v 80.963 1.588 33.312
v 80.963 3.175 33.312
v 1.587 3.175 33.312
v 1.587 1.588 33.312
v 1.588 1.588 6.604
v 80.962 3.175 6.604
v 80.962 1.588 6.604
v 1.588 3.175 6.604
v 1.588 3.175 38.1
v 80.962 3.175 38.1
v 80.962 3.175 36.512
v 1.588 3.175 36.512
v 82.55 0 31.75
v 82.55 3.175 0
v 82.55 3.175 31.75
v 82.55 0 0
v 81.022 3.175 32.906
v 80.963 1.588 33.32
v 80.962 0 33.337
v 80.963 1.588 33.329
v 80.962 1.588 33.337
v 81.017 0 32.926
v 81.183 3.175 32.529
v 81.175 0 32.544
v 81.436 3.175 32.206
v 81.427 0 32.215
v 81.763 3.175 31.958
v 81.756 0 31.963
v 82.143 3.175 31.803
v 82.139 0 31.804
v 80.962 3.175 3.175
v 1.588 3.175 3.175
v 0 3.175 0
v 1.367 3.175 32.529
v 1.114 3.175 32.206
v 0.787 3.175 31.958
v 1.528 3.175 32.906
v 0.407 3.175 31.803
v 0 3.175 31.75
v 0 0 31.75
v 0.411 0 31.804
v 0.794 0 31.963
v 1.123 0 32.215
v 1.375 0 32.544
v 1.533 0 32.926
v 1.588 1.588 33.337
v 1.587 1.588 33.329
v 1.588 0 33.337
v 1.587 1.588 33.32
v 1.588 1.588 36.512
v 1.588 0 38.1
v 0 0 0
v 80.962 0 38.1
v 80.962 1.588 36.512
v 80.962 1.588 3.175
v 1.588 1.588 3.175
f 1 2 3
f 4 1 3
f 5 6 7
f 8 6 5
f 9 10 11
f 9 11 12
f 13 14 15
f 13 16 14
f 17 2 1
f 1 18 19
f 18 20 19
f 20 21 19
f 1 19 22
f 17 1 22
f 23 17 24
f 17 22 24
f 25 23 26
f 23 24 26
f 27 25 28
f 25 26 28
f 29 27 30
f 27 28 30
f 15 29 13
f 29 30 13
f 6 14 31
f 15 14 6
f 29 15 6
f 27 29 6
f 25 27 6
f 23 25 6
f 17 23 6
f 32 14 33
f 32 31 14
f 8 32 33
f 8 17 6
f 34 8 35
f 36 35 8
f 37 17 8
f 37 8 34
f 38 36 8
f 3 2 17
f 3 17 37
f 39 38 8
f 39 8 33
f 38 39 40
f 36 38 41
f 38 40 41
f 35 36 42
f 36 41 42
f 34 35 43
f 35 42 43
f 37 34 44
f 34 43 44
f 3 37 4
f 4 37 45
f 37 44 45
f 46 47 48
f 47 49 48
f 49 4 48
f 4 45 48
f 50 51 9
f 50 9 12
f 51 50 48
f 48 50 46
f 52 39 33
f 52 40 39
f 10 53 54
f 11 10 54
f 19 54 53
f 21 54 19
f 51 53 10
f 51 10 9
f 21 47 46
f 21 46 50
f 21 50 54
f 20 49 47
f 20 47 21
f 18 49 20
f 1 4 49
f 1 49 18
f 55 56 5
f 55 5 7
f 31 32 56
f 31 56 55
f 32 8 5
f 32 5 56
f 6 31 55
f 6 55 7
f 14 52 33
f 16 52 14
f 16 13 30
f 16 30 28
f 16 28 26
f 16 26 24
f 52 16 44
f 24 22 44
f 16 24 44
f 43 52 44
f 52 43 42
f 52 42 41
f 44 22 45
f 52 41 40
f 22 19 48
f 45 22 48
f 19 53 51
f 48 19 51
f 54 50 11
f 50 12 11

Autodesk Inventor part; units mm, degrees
ref_plane "YZ Plane" through (0, 0, 0) normal (1, 0, 0) x (0, 1, 0)
ref_plane "XZ Plane" through (0, 0, 0) normal (0, 1, 0) x (-1, 0, 0)
ref_plane "XY Plane" through (0, 0, 0) normal (0, 0, 1) x (1, 0, 0)
sketch "Sketch1" plane through (0, 0, 0) normal (0, 1, 0) x (-1, 0, 0)
  line L0 (0, 0) -> (-82.55, 0)
  line L1 (-82.55, 0) -> (-82.55, 38.1)
  line L2 (-82.55, 38.1) -> (0, 38.1)
  line L3 (0, 38.1) -> (0, 0)
  dimension "d0" = 82.55
  dimension "d1" = 38.1
extrude "Extrusion1" add sketch "Sketch1" along normal blind 3.175
sketch "Sketch2" plane through (0, 3.175, 0) normal (0, 1, 0) x (1, 0, 0)
  line L0 (82.55, 0) -> (0, 0) projected
  line L1 (0, 0) -> (0, -38.1) projected
  line L2 (0, -38.1) -> (82.55, -38.1) projected
  line L3 (82.55, -38.1) -> (82.55, 0) projected
  line L4 (0, -36.5125) -> (82.55, -36.5125)
  line L5 (82.55, -36.5125) -> (82.55, -33.3121)
  line L6 (82.55, -33.3121) -> (0, -33.3121)
  line L7 (0, -33.3121) -> (0, -36.5125)
  line L8 (1.5875, -3.175) -> (80.9625, -3.175)
  line L9 (80.9625, -3.175) -> (80.9625, -6.604)
  line L10 (80.9625, -6.604) -> (1.5875, -6.604)
  line L11 (1.5875, -6.604) -> (1.5875, -3.175)
  dimension "d6" = 3.2004
  dimension "d7" = 1.5875
  dimension "d10" = 3.175
  dimension "d11" = 3.429
  dimension "d12" = 1.5875
  dimension "d13" = 1.5875
extrude "Extrusion2" cut sketch "Sketch2" against normal blind 1.5875 contours L3 L4 L1 L6
sketch "Sketch3" plane through (0, 3.175, 0) normal (0, 1, 0) x (1, 0, 0)
  line L0 (82.55, -33.3121) -> (82.55, 0) projected
  line L1 (82.55, 0) -> (0, 0) projected
  line L2 (0, 0) -> (0, -33.3121) projected
  line L3 (1.5875, -3.175) -> (80.9625, -3.175)
  line L4 (80.9625, -3.175) -> (80.9625, -6.604)
  line L5 (80.9625, -6.604) -> (1.5875, -6.604)
  line L6 (1.5875, -6.604) -> (1.5875, -3.175)
  dimension "d14" = 1.5875
  dimension "d15" = 1.5875
  dimension "d16" = 3.175
  dimension "d17" = 3.429
extrude "Extrusion3" cut sketch "Sketch3" against normal blind 1.5875
sketch "Sketch4" plane through (0, 3.175, 0) normal (0, 1, 0) x (1, 0, 0)
  line L0 (0, -38.1) -> (1.5875, -38.1)
  line L1 (1.5875, -38.1) -> (1.5875, -31.75)
  line L2 (1.5875, -31.75) -> (0, -31.75)
  line L3 (0, -31.75) -> (0, -38.1)
  line L4 (82.55, -38.1) -> (80.9625, -38.1)
  line L5 (80.9625, -38.1) -> (80.9625, -31.75)
  line L6 (80.9625, -31.75) -> (82.55, -31.75)
  line L7 (82.55, -31.75) -> (82.55, -38.1)
  point P0 (0, 0)
  dimension "d20" = 1.5875
  dimension "d21" = 6.35
  dimension "d22" = 6.35
  dimension "d23" = 1.5875
extrude "Extrusion4" cut sketch "Sketch4" against normal blind 25.4
fillet "Fillet1" radius 1.5875 1 edges at (80.9625, 1.5875, 31.75)
fillet "Fillet2" radius 1.5875 1 edges at (1.5875, 1.5875, 31.75)
properties part number "Electronics Container Part 4"
